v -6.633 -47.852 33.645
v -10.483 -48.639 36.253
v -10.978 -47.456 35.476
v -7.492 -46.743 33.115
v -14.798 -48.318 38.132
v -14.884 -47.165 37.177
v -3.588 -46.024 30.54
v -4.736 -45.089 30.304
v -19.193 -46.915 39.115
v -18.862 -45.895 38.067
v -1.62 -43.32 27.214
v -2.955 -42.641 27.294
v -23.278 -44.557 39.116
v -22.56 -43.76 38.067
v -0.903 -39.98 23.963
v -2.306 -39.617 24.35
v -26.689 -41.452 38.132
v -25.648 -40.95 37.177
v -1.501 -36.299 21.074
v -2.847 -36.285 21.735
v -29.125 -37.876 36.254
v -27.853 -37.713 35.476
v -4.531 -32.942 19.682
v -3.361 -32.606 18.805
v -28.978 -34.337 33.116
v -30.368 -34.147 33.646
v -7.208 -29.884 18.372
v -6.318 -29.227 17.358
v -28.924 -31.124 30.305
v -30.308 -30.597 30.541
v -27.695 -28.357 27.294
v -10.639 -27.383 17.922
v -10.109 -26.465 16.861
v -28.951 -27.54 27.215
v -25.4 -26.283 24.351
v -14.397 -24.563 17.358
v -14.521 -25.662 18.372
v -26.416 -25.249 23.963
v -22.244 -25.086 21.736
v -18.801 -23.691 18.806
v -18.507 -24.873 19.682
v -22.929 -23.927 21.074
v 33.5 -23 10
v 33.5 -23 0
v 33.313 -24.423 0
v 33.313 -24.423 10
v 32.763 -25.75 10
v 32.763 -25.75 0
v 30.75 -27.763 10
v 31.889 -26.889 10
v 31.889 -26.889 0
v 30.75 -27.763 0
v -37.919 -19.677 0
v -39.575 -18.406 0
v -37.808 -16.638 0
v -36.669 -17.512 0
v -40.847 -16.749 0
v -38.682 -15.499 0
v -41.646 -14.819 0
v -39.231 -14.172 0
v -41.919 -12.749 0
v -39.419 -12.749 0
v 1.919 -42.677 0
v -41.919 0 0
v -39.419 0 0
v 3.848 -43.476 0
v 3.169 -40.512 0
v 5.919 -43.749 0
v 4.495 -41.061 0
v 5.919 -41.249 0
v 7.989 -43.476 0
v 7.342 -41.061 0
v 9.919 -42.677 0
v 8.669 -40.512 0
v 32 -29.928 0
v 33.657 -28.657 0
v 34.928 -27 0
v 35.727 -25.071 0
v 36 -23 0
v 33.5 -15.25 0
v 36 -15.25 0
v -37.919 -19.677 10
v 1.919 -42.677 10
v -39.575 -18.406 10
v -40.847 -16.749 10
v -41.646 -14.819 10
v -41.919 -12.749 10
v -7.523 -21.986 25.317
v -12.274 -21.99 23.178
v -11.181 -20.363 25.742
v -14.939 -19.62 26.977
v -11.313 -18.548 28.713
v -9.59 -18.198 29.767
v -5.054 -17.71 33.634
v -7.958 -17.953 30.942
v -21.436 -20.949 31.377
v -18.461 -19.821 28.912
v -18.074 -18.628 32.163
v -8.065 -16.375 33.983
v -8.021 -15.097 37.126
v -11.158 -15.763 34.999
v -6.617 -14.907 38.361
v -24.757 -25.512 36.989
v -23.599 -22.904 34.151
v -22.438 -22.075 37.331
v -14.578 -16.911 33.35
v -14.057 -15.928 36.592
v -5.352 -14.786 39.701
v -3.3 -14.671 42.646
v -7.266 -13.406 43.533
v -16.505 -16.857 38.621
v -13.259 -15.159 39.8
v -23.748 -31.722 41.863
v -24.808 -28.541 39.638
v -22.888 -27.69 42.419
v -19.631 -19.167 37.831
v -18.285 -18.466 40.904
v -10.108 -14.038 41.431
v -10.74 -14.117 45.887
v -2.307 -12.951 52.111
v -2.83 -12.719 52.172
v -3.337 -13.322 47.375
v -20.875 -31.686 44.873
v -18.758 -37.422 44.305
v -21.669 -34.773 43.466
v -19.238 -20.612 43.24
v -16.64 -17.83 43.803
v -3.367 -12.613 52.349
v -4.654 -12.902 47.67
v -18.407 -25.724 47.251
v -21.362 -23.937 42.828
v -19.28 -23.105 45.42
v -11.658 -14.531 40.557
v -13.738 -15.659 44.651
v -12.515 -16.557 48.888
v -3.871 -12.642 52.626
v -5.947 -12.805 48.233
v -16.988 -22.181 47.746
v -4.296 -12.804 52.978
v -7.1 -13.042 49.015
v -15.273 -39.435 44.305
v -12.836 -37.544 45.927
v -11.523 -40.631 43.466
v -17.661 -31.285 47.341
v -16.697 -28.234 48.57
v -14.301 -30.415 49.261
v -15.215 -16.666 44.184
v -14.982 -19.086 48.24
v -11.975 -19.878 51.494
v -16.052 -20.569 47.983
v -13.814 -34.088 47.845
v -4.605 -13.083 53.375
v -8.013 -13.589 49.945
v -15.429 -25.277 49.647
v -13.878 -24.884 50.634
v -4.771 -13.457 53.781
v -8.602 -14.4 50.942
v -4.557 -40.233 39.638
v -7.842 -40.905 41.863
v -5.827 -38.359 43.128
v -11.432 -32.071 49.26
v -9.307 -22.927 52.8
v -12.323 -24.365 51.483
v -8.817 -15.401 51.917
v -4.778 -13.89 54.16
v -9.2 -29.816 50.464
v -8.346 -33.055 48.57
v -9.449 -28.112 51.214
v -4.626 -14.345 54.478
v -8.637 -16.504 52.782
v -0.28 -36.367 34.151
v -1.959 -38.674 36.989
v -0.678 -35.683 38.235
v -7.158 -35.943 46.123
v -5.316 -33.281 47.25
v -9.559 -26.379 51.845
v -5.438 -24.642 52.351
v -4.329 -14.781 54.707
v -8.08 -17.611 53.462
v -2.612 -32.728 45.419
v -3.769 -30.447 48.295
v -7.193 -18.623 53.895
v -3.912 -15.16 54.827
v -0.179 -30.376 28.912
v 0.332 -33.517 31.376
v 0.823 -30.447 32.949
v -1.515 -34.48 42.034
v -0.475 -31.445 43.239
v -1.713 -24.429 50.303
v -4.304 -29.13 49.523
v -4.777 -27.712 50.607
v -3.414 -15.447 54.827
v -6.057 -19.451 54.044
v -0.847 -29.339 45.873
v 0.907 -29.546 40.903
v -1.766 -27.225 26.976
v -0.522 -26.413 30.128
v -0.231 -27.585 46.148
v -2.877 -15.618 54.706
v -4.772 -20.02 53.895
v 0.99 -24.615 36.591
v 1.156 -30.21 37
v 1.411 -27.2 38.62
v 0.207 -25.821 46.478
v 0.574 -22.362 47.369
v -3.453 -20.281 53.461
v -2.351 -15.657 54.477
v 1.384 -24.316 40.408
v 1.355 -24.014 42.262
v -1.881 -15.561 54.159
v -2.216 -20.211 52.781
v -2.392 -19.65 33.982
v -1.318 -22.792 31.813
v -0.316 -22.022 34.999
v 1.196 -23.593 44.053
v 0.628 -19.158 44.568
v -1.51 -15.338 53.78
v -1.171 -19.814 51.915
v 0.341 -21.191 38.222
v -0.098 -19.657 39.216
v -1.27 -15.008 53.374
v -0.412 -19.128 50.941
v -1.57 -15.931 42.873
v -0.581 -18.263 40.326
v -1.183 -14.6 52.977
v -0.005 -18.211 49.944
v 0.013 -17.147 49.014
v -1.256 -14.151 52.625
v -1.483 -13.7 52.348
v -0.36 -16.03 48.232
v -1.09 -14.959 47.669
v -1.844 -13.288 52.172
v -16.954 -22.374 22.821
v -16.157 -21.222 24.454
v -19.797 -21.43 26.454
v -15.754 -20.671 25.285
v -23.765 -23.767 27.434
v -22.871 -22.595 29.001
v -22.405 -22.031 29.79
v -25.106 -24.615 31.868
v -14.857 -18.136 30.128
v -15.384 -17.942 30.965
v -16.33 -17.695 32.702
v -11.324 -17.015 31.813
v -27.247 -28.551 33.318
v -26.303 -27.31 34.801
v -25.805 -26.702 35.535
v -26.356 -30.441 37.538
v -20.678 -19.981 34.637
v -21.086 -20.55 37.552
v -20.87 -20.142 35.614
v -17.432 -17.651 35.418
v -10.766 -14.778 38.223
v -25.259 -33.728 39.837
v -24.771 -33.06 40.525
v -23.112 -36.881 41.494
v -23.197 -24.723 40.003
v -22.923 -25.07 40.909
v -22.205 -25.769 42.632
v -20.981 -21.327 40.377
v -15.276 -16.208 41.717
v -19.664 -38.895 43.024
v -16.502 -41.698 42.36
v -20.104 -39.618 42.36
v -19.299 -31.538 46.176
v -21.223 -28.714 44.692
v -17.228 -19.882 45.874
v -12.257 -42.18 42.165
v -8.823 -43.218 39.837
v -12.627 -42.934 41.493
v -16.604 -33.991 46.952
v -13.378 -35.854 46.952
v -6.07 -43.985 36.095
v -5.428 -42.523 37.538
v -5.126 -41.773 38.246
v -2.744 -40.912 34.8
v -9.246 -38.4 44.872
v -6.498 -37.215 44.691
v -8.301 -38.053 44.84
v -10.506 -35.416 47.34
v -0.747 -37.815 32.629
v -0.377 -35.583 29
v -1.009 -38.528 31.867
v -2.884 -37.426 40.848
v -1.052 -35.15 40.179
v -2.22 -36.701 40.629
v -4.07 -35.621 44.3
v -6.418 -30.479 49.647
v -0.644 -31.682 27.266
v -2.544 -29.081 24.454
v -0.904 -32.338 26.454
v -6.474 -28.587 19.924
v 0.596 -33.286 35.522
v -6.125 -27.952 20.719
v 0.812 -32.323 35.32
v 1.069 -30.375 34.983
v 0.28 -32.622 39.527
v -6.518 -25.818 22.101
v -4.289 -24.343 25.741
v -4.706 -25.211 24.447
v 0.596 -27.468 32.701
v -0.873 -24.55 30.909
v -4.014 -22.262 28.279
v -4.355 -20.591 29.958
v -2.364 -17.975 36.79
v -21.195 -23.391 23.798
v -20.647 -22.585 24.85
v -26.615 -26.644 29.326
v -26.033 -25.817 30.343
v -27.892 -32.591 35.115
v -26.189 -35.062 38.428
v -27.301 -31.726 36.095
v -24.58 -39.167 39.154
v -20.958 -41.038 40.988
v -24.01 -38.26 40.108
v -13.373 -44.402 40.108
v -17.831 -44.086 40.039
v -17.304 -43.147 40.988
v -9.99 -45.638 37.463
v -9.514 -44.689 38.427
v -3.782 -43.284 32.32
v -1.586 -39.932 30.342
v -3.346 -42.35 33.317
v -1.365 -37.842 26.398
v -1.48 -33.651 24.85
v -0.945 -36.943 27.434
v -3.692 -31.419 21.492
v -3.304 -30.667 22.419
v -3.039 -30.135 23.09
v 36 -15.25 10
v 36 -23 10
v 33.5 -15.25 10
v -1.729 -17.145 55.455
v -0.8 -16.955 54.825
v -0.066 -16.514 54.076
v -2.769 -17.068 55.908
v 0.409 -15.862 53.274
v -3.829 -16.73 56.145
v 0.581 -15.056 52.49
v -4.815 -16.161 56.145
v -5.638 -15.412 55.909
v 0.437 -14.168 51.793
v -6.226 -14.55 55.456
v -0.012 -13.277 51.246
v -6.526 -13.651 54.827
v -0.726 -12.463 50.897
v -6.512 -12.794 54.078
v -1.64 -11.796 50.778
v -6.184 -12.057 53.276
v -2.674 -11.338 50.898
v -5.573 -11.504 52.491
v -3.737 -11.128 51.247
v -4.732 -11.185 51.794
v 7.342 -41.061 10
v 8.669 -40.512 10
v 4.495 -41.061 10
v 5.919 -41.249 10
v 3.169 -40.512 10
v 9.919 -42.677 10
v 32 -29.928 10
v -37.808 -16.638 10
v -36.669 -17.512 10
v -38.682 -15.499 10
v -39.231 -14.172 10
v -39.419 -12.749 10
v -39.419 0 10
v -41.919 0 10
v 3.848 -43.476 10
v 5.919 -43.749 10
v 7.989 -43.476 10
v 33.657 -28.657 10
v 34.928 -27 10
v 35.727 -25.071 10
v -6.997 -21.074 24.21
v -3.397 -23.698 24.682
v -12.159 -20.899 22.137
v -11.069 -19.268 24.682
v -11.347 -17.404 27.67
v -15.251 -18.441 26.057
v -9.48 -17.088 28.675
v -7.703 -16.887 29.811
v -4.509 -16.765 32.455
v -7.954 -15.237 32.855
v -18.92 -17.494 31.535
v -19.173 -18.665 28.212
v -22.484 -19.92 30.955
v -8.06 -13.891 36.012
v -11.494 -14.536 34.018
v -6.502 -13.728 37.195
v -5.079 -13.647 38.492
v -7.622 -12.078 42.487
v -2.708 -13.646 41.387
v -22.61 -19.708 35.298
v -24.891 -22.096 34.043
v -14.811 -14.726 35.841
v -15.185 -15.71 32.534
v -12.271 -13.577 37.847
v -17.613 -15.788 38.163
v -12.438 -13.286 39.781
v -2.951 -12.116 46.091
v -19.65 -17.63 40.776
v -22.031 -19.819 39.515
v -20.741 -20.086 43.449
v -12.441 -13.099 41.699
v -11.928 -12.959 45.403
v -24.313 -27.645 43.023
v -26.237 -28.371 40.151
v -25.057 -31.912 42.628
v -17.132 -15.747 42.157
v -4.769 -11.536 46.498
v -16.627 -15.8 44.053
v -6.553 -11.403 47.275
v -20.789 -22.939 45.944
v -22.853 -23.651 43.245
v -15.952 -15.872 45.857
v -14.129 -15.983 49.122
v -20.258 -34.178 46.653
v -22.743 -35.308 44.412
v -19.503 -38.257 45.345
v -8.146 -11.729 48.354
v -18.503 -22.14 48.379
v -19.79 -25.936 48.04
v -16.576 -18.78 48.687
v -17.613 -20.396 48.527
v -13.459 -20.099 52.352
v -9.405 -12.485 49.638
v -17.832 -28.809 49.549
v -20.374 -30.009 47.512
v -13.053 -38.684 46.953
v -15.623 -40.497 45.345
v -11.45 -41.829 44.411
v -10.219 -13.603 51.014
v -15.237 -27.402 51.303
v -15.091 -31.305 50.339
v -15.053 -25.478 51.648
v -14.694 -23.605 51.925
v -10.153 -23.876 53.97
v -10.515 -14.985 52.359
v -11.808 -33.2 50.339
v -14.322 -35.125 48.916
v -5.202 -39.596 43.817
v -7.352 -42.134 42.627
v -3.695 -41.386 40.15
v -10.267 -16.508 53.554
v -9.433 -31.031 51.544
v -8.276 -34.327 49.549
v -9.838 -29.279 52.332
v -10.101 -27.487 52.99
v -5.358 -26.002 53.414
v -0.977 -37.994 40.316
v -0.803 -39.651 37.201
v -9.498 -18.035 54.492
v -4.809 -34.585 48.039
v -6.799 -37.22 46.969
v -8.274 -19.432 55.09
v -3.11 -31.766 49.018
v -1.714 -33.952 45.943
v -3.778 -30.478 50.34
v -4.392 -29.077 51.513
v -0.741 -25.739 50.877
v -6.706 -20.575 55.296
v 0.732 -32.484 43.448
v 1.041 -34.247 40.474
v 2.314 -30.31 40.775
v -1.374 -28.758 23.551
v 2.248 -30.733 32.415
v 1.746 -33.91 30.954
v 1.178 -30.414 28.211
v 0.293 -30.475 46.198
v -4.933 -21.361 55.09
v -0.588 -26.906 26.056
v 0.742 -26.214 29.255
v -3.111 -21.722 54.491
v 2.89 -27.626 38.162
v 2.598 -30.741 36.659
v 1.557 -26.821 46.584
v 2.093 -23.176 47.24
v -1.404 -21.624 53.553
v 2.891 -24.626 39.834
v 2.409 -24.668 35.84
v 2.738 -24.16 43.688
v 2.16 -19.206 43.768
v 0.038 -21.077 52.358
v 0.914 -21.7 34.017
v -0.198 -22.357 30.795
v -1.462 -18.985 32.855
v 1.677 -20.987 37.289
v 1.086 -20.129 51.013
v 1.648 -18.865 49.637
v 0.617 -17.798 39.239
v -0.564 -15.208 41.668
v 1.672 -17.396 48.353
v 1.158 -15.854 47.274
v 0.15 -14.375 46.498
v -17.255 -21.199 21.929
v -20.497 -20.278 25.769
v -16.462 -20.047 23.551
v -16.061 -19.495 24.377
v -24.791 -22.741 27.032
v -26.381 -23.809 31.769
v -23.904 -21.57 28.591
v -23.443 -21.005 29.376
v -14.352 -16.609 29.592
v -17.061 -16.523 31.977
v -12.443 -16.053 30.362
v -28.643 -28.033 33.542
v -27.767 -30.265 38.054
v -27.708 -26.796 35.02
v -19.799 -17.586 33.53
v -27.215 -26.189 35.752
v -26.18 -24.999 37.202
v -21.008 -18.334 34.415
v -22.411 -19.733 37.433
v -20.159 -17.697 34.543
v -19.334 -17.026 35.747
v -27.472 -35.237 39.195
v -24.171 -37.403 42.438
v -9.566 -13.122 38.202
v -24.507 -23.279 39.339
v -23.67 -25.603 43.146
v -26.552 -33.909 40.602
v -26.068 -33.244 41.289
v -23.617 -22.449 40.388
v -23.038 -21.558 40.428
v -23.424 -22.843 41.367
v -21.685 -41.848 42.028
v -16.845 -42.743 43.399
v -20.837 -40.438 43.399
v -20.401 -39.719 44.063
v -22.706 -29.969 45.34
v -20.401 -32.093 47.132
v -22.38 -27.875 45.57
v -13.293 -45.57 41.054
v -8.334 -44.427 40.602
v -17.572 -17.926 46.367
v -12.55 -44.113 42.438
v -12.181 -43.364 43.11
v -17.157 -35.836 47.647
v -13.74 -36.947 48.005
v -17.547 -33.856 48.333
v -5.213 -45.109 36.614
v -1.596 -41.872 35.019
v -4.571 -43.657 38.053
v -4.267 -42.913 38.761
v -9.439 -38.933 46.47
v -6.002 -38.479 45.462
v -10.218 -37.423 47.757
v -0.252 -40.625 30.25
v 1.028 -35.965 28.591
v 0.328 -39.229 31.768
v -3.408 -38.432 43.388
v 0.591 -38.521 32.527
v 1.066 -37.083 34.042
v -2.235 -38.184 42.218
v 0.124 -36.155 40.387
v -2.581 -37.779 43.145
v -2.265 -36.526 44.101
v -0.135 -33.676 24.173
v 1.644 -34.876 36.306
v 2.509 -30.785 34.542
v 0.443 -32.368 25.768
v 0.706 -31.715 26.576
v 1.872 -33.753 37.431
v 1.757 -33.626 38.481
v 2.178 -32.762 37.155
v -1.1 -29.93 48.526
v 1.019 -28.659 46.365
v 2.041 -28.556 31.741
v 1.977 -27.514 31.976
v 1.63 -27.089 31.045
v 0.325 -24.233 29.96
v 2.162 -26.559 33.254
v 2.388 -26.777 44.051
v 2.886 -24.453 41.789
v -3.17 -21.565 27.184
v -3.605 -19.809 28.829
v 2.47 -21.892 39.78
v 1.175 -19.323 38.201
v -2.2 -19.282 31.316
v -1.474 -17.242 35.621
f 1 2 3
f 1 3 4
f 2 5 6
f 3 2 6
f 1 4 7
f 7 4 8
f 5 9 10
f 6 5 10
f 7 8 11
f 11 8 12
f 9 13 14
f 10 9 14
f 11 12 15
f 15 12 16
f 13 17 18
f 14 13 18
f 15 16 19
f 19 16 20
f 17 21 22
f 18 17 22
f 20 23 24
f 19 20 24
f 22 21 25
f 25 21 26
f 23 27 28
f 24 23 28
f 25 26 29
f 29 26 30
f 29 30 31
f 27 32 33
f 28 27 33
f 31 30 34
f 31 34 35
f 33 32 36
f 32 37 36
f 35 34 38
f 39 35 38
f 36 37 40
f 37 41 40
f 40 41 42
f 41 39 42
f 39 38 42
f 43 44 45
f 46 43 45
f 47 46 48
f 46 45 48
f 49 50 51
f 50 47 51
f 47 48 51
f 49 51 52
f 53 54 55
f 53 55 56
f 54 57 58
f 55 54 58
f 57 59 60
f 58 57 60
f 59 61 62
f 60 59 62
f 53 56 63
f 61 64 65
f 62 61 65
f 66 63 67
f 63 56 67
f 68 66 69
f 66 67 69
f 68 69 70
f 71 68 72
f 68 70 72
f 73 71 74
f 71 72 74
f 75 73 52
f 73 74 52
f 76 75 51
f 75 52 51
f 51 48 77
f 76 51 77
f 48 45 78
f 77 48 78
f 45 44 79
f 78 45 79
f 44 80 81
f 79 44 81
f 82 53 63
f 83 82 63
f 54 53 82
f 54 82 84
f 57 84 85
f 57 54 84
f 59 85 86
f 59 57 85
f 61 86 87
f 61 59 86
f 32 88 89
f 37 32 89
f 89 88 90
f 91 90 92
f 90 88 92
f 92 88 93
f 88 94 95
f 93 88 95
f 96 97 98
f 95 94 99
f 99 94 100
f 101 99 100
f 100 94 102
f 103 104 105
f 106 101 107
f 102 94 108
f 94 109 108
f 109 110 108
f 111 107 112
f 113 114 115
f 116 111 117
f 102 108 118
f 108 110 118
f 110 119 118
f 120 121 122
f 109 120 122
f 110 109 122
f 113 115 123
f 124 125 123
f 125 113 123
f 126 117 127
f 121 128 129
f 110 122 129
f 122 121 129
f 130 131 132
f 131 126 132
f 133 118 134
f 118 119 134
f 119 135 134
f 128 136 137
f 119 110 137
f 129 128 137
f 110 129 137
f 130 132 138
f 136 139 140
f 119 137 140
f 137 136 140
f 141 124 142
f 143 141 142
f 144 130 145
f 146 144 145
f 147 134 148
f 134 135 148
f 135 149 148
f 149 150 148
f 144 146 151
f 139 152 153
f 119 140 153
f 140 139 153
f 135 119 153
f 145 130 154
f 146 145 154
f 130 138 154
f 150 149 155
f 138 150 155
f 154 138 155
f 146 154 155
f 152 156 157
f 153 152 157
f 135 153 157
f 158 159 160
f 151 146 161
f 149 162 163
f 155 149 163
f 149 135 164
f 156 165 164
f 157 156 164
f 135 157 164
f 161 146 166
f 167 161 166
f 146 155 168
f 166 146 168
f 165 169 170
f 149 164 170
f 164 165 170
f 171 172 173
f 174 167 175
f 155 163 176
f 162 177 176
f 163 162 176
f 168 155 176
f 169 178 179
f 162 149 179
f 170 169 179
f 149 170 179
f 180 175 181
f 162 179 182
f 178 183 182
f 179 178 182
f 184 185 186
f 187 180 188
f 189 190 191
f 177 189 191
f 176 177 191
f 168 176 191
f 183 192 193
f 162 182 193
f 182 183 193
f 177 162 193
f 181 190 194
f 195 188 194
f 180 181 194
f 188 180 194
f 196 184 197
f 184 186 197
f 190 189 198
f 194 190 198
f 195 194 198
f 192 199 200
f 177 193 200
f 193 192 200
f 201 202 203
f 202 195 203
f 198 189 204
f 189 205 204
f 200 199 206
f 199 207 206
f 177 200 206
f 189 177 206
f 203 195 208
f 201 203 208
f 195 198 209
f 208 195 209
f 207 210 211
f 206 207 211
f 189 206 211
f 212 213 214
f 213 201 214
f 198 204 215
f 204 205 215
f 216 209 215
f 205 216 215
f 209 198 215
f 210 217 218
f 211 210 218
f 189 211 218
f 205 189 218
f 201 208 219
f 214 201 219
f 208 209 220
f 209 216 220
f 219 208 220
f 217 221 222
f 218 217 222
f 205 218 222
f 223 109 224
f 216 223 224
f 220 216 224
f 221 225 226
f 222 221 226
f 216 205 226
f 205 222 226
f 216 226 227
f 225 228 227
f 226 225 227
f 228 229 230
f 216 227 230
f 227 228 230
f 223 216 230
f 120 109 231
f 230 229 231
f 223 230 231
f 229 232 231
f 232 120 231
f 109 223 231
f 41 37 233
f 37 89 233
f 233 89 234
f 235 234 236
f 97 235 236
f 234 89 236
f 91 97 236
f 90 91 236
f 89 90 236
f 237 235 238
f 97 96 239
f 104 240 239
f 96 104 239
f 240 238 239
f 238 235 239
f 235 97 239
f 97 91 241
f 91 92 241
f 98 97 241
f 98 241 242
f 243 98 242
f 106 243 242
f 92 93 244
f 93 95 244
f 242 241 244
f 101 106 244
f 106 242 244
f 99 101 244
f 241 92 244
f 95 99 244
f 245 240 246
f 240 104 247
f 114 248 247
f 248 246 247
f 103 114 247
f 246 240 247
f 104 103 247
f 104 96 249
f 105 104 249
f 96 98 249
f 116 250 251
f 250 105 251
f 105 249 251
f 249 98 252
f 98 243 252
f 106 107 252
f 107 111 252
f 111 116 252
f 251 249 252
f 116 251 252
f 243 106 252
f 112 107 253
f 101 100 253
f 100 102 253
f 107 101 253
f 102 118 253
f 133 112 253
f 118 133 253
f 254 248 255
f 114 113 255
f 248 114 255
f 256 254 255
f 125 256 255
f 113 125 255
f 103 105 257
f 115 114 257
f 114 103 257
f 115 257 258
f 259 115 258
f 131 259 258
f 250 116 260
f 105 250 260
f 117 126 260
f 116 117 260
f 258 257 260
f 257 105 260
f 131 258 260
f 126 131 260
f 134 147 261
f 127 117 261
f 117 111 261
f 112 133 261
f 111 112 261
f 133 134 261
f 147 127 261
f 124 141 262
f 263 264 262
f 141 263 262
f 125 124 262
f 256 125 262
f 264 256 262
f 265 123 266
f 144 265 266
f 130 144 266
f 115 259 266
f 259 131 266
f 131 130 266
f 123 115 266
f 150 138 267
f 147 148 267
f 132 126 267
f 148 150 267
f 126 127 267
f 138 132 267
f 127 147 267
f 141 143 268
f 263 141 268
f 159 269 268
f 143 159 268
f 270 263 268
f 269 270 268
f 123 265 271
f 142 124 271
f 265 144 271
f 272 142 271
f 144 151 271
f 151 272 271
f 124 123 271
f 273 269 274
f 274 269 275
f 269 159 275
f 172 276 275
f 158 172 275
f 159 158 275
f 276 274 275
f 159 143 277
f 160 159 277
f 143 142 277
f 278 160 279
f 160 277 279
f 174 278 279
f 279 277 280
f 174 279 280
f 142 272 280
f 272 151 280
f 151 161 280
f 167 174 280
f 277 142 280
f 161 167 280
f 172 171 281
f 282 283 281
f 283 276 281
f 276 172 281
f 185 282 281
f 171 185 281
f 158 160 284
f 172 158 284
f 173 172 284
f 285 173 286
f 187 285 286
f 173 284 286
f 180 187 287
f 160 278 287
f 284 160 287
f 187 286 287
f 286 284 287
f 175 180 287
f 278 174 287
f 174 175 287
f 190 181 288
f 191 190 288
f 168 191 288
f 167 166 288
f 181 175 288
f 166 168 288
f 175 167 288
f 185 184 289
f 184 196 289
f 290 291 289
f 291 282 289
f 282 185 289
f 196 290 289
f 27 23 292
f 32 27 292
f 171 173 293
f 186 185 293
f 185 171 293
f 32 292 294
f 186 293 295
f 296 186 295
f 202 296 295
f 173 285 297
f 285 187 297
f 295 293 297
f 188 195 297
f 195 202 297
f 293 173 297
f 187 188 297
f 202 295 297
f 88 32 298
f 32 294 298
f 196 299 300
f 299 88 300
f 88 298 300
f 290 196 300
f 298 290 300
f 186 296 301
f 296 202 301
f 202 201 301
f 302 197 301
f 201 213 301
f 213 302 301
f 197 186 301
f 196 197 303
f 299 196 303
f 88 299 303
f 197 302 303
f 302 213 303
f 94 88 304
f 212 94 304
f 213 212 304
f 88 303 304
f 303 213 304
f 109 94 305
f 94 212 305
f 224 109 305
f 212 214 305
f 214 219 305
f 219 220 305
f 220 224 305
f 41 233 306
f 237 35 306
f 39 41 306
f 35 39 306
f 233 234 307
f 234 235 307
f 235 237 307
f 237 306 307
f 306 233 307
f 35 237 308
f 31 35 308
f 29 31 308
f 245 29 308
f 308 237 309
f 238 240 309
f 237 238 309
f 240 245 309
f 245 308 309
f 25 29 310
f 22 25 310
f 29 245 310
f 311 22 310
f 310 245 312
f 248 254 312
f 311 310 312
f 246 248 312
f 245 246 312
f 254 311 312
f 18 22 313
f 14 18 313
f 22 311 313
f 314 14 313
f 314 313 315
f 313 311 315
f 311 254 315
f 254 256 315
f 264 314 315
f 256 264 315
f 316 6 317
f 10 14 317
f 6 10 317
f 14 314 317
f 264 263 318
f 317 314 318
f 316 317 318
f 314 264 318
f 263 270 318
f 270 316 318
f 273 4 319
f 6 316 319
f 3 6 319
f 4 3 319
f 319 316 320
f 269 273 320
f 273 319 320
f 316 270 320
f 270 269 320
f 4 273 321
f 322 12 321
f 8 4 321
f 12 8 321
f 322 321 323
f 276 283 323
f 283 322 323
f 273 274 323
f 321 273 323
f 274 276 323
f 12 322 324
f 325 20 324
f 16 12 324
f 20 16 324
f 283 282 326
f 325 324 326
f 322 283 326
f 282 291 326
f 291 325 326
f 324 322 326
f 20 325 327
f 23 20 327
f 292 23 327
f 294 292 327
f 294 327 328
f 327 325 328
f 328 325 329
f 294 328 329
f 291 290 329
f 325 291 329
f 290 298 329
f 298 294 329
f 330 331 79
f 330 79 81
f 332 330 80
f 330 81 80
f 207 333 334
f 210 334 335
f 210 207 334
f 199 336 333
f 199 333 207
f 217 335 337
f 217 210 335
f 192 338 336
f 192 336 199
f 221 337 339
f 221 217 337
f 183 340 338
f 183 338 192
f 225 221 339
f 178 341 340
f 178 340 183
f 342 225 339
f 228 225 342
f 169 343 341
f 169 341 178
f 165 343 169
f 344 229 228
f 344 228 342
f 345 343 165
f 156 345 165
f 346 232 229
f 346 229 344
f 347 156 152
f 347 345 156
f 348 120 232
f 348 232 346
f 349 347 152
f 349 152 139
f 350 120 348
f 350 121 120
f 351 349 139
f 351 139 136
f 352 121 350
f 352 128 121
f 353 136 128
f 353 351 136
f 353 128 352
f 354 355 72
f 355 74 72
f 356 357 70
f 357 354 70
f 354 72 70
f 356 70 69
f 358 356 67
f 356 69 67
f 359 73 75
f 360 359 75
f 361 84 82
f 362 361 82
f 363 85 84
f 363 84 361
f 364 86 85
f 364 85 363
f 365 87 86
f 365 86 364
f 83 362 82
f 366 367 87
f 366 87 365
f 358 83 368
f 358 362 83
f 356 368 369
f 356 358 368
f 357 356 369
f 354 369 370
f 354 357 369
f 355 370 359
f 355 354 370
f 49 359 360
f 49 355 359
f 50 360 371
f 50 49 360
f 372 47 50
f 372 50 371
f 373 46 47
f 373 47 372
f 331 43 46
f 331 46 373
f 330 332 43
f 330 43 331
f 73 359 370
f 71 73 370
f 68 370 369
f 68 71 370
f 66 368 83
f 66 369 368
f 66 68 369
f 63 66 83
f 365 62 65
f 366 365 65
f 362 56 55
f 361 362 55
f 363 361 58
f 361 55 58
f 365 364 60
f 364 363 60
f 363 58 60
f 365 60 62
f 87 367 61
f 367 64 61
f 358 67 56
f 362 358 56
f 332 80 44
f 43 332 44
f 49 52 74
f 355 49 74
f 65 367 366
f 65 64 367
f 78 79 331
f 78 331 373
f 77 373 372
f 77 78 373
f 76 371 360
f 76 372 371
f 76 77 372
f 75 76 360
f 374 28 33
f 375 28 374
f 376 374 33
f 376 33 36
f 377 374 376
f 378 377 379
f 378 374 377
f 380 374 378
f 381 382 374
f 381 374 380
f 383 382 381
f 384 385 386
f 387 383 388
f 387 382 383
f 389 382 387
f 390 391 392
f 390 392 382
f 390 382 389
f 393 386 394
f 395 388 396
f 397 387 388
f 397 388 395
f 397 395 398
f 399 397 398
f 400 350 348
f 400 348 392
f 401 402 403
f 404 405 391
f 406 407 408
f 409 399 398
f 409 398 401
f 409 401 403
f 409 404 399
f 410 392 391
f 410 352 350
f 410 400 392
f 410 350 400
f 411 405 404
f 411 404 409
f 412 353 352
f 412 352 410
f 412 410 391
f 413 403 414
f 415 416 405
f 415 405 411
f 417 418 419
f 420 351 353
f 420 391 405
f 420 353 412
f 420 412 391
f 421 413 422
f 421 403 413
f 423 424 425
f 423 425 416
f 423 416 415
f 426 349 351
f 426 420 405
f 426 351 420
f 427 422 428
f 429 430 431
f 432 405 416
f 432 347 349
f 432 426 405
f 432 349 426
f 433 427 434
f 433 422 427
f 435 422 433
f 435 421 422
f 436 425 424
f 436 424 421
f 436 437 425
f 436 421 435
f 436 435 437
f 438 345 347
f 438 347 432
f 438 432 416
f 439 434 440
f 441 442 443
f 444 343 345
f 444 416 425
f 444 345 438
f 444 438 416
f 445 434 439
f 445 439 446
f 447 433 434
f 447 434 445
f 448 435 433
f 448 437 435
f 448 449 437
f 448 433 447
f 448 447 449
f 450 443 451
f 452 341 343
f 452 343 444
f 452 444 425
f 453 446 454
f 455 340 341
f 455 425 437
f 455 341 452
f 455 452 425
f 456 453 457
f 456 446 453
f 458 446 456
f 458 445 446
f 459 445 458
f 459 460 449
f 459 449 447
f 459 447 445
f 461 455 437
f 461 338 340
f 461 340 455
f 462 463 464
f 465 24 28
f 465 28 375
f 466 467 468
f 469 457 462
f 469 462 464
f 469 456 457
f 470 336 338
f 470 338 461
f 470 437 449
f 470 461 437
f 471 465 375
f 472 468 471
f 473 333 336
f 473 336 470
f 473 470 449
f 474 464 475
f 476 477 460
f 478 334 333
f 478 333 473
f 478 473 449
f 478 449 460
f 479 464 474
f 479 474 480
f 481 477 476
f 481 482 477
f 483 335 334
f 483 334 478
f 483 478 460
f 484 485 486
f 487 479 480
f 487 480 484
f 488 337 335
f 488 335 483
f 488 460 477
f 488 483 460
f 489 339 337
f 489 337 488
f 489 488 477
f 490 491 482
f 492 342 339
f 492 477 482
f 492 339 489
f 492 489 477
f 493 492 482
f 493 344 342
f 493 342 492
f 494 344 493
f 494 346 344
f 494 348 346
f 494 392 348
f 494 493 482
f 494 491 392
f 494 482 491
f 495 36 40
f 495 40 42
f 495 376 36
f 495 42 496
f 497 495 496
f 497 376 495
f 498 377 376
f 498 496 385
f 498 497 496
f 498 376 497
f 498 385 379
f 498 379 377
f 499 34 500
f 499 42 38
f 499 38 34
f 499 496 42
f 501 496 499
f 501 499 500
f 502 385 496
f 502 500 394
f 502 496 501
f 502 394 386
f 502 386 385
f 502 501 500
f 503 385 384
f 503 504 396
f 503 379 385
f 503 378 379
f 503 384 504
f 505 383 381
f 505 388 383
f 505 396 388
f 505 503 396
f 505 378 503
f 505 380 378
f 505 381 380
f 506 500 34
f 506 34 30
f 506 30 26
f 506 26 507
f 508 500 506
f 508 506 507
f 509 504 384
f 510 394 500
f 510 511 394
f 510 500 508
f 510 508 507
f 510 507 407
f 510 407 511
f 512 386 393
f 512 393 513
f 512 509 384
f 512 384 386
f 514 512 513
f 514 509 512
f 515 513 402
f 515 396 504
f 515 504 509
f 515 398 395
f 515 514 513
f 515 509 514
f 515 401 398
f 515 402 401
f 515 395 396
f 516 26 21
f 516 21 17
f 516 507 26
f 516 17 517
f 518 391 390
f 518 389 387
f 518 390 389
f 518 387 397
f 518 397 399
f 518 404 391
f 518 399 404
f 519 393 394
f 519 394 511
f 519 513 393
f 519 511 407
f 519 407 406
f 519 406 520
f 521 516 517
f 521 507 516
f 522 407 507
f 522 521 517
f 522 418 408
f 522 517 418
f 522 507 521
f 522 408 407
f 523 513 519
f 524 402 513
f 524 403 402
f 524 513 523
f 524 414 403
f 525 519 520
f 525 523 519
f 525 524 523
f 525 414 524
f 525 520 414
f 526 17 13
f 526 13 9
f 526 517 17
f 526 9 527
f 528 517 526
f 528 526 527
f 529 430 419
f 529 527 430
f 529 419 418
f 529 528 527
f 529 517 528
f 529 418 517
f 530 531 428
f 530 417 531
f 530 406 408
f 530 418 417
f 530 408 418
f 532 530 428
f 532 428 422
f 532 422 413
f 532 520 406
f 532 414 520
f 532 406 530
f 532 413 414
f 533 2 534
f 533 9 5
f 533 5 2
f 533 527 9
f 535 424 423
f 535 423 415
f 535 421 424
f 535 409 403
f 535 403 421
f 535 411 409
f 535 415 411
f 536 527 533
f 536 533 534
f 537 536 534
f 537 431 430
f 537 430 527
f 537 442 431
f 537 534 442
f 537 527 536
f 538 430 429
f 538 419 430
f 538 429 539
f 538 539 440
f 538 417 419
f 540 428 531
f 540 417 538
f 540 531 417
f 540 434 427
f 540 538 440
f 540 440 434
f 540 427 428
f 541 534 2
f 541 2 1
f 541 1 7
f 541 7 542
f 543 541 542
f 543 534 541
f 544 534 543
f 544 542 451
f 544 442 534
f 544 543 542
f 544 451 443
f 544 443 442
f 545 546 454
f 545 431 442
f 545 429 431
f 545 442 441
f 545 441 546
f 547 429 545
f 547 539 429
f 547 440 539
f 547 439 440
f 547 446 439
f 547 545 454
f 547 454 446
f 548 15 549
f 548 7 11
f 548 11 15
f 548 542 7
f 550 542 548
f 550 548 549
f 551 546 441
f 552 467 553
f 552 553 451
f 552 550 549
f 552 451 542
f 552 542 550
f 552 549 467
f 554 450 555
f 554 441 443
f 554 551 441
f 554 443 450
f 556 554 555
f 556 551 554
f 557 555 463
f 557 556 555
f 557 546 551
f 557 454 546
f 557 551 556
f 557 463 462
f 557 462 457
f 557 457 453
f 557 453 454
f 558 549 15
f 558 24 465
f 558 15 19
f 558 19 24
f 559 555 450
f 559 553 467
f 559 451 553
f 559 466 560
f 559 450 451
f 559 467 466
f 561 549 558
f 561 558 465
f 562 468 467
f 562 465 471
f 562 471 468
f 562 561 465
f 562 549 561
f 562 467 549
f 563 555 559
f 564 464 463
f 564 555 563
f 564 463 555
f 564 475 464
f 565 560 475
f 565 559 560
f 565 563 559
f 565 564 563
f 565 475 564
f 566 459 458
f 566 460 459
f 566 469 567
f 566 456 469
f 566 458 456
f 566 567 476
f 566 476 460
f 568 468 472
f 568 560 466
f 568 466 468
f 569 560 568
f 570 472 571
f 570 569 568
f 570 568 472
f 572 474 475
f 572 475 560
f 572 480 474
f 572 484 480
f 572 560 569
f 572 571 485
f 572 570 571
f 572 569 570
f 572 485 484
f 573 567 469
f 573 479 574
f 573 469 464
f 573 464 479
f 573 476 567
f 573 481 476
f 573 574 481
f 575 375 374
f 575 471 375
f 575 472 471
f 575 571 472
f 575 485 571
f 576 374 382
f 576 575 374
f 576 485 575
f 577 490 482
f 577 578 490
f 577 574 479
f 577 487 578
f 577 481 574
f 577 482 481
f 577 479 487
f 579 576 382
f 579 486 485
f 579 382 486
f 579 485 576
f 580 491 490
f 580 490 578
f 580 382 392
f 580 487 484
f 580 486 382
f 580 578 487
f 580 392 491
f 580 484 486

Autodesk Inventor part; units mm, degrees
ref_plane "YZ Plane" through (0, 0, 0) normal (1, 0, 0) x (0, 1, 0)
sketch "Sketch1" plane through (0, 0, 0) normal (0, 0, 1) x (1, 0, 0)
  circle A0 centre (-21.75, -3) radius 1 projected
  circle A1 centre (-14.9186, 14) radius 1.5 projected
  circle A2 centre (-14.9186, -14) radius 1.5 projected
  circle A3 centre (21, 8.5) radius 1.5 projected
  circle A4 centre (9, 0) radius 1.5 projected
  circle A5 centre (21, -8.5) radius 1.5 projected
  circle A6 centre (12, -9) radius 6 projected
  circle A7 centre (12, 9) radius 6 projected
  circle A8 centre (5.9186, 35.7487) radius 2 projected
  circle A9 centre (-33.9186, 12.7487) radius 2 projected
  circle A10 centre (-33.9186, -12.7487) radius 2 projected
  circle A11 centre (5.9186, -35.7487) radius 2 projected
  circle A12 centre (28, -23) radius 2 projected
  circle A13 centre (28, 23) radius 2 projected
  line L0 (27, -14.75) -> (7, -14.75) projected
  line L1 (7, 14.75) -> (27, 14.75) projected
  circle A14 centre (28, -23) radius 5
  circle A15 centre (5.9186, -35.7487) radius 5
  circle A16 centre (28, 23) radius 5
  circle A17 centre (5.9186, 35.7487) radius 5
  line L2 (-41.9186, 0) -> (-41.9186, -12.7487)
  arc A18 (-41.9186, -12.7487) -> (-37.9186, -19.6769) centre (-33.9186, -12.7487) ccw
  line L3 (-37.9186, -19.6769) -> (1.9186, -42.6769)
  arc A19 (1.9186, -42.6769) -> (9.9186, -42.6769) centre (5.9186, -35.7487) ccw
  line L4 (9.9186, -42.6769) -> (32, -29.9282)
  arc A20 (32, -29.9282) -> (36, -23) centre (28, -23) ccw
  circle A21 centre (28, -23) radius 5.5
  circle A22 centre (5.9186, -35.7487) radius 5.5
  arc A23 (30.75, -27.7631) -> (33.5, -23) centre (28, -23) ccw
  line L5 (30.75, -27.7631) -> (8.6686, -40.5119)
  arc A24 (3.1686, -40.5119) -> (8.6686, -40.5119) centre (5.9186, -35.7487) ccw
  line L6 (3.1686, -40.5119) -> (-36.6686, -17.5119)
  arc A25 (-39.4186, -12.7487) -> (-36.6686, -17.5119) centre (-33.9186, -12.7487) ccw
  line L7 (-39.4186, -12.7487) -> (-39.4186, 0)
  line L8 (36, -15.25) -> (7, -15.25)
  line L9 (33.5, -15.25) -> (33.5, -23)
  line L10 (36, -23) -> (36, -15.25)
  line L11 (-57.1316, 0) -> (50.3748, 0) construction
  line L12 (-41.9186, 0) -> (-39.4186, 0)
  line L13 (36, -23) -> (36, 23) projected
  arc A26 (36, 23) -> (32, 29.9282) centre (28, 23) ccw projected
  line L14 (32, 29.9282) -> (9.9186, 42.6769) projected
  arc A27 (9.9186, 42.6769) -> (1.9186, 42.6769) centre (5.9186, 35.7487) ccw projected
  line L15 (1.9186, 42.6769) -> (-37.9186, 19.6769) projected
  arc A28 (-37.9186, 19.6769) -> (-41.9186, 12.7487) centre (-33.9186, 12.7487) ccw projected
  line L16 (-41.9186, 12.7487) -> (-41.9186, -12.7487) projected
  arc A29 (-41.9186, -12.7487) -> (-37.9186, -19.6769) centre (-33.9186, -12.7487) ccw projected
  line L17 (-37.9186, -19.6769) -> (1.9186, -42.6769) projected
  arc A30 (1.9186, -42.6769) -> (9.9186, -42.6769) centre (5.9186, -35.7487) ccw projected
  line L18 (9.9186, -42.6769) -> (32, -29.9282) projected
  arc A31 (32, -29.9282) -> (36, -23) centre (28, -23) ccw projected
  circle A32 centre (-33.4186, -0.7261) radius 1.5 projected
  circle A33 centre (16.0805, 29.3044) radius 1.5 projected
  circle A34 centre (17.3381, -28.5783) radius 1.5 projected
  circle A35 centre (-13.1686, 3) radius 1 projected
  point P0 (0, 0)
  point P1 (-12.8721, -34.1375)
  point P2 (-12.8721, -31.2507)
  dimension "d3" = 0.5
  dimension "d4" = 0.5
  dimension "d7" = 0.5
extrude "Extrusion1" add sketch "Sketch1" along normal blind 10 contours L12 L7 A25 L6 A22 L5 A21 L9 L8 L10 A20 L4 A19 L3 A18 L2
ref_plane "Work Plane1" through (-15.7131, -36.1715, 28.0312) normal (0.3536, 0.6124, 0.7071) x (0.866, -0.5, 0)
sketch "Sketch3" plane through (-15.7131, -36.1715, 28.0312) normal (0.3536, 0.6124, 0.7071) x (0.866, -0.5, 0)
  line L0 (-12.5, 15) -> (12.5, 15) projected
  arc A0 (-12.5, 15) -> (-15, 12.5) centre (-12.5, 12.5) ccw projected
  line L1 (-15, 12.5) -> (-15, -12.5) projected
  arc A1 (-15, -12.5) -> (-12.5, -15) centre (-12.5, -12.5) ccw projected
  line L2 (-12.5, -15) -> (12.5, -15) projected
  arc A2 (12.5, -15) -> (15, -12.5) centre (12.5, -12.5) ccw projected
  line L3 (15, 12.5) -> (15, -12.5) projected
  arc A3 (15, 12.5) -> (12.5, 15) centre (12.5, 12.5) ccw projected
  circle A4 centre (0, 0) radius 14.375 projected
  circle A5 centre (-12, -12) radius 1.75 projected
  circle A6 centre (-12, 12) radius 1.75 projected
  circle A7 centre (12, -12) radius 1.75 projected
  circle A8 centre (12, 12) radius 1.75 projected
  line L4 (0, 22.779) -> (0, -22.2099)
  point P0 (-4.4778, 47.5269)
ref_plane "Work Plane2" through (-15.7131, -36.1715, 28.0312) normal (0.866, -0.5, 0) x (0.3536, 0.6124, 0.7071)
ref_plane "Work Plane3" through (10.25, -12.0311, 55) normal (0, 0, 1) x (1, 0, 0)
sketch "Sketch5" plane through (-15.7131, -36.1715, 28.0312) normal (0.866, -0.5, 0) x (0.3536, 0.6124, 0.7071)
  line L0 (0.0278, -14.3239) -> (0.0278, -13.5559)
  line L1 (-72.0235, 0) -> (108.8939, 0) projected
  arc A0 (0.0278, -14.3239) -> (35.9865, -1.9308) centre (-0.1447, 44.5401) ccw
  arc A1 (0.0278, -15.8239) -> (35.9865, -3.8168) centre (-0.1447, 44.5401) ccw
  line L2 (35.9865, -1.9308) -> (35.9865, -3.8168)
  line L3 (0.0278, -14.3239) -> (0.0278, -15.8239)
  point P0 (7.8848, -47.5269)
  dimension "d13" = 1.5
revolve "Revolution2" add sketch "Sketch5" angle 360 about axis through (-15.7131, -36.1715, 28.0312) along (0.3536, 0.6124, 0.7071)
sketch "Sketch7" plane through (0, 0, 0) normal (0, 0, -1) x (-1, 0, 0)
  ellipse E0 centre (15.7131, -36.1715) end of major axis (28.1622, -28.984) minor radius 10.1647 (23.1946, -25.2911) -> (2.5497, -37.2104) ccw
  line L0 (-1.6967, -36.0168) -> (-0.1183, -38.7507)
  line L1 (10.1911, -51.6071) -> (31.8417, -39.1071) projected
  line L2 (25.8625, -23.7507) -> (24.2841, -21.0168)
  line L3 (-3.1686, -40.5119) -> (25.8625, -23.7507)
  line L4 (-3.951, -27.1122) -> (17.6996, -14.6122)
  ellipse E1 centre (18.5835, -16.1431) end of major axis (16.4184, -17.3931) minor radius 1.7678 (20.7485, -14.8931) -> (17.6996, -14.6122) ccw
  ellipse E2 centre (-3.0672, -28.6431) end of major axis (-0.9021, -27.3931) minor radius 1.7678 (-3.951, -27.1122) -> (-5.2322, -29.8931) ccw
  line L5 (24.2841, -21.0168) -> (20.7485, -14.8931) projected
  line L6 (24.2841, -21.0168) -> (20.7485, -14.8931)
  line L7 (20.7485, -14.8931) -> (29.5874, -30.2024) projected
  ellipse E3 centre (-3.0672, -28.6431) end of major axis (-0.9021, -27.3931) minor radius 1.7678 (-3.951, -27.1122) -> (-5.2322, -29.8931) ccw projected
  line L8 (-1.6967, -36.0168) -> (-5.2322, -29.8931)
  point P0 (0, 0)
sketch "Sketch8" plane through (-15.7131, -36.1715, 28.0312) normal (-0.3536, -0.6124, -0.7071) x (-0.866, 0.5, 0)
  line L0 (15, 5.0396) -> (15, -5.0396) projected
  arc A0 (15, -5.0396) -> (15, 5.0396) centre (0, 0) ccw projected
  arc A1 (-15, 5.0396) -> (-15, -5.0396) centre (0, 0) ccw projected
  line L1 (-15, 12.5) -> (-15, -12.5) projected
  circle A2 centre (-12, -12) radius 1.75 projected
  arc A3 (-12.0548, -10.2509) -> (-10.2509, -12.0548) centre (0, 0) ccw projected
  arc A4 (-5.0396, -15) -> (5.0396, -15) centre (0, 0) ccw projected
  line L2 (-12.5, -15) -> (12.5, -15) projected
  circle A5 centre (12, -12) radius 1.75 projected
  arc A6 (10.2509, -12.0548) -> (12.0548, -10.2509) centre (0, 0) ccw projected
  circle A7 centre (12, 12) radius 1.75 projected
  arc A8 (12.0548, 10.2509) -> (10.2509, 12.0548) centre (0, 0) ccw projected
  arc A9 (-10.2509, 12.0548) -> (-12.0548, 10.2509) centre (0, 0) ccw projected
  circle A10 centre (-12, 12) radius 1.75 projected
  point P0 (4.4778, 47.5269)
sketch "Sketch9" plane through (-15.7131, -36.1715, 28.0312) normal (-0.3536, -0.6124, -0.7071) x (-0.866, 0.5, 0)
  arc A0 (15, 12.5) -> (12.5, 15) centre (12.5, 12.5) ccw
  arc A1 (-12.5, 15) -> (-15, 12.5) centre (-12.5, 12.5) ccw
  line L0 (-15, 15) -> (-15, 12.5)
  line L1 (15, 12.5) -> (15, 15)
  line L2 (12.5, 15) -> (-12.5, 15) projected
  line L3 (-12.5, 15) -> (-15, 15)
  line L4 (12.5, 15) -> (15, 15)
  point P0 (4.4778, 47.5269)
  point P1 (-1.4434, 15)
sketch "Sketch10" plane through (0, 0, 0) normal (0, 0, -1) x (-1, 0, 0)
  ellipse E0 centre (18.5835, -16.1431) end of major axis (20.7485, -14.8931) minor radius 1.7678 (20.7485, -14.8931) -> (17.6996, -14.6122) ccw projected
  line L0 (20.7485, -14.8931) -> (19.8647, -13.3622) projected
  line L1 (17.6996, -14.6122) -> (19.8647, -13.3622) projected
  ellipse E1 centre (-3.0672, -28.6431) end of major axis (-5.2322, -29.8931) minor radius 1.7678 (-3.951, -27.1122) -> (-5.2322, -29.8931) ccw projected
  line L2 (-6.1161, -28.3622) -> (-3.951, -27.1122) projected
  line L3 (-5.2322, -29.8931) -> (-6.1161, -28.3622) projected
  point P0 (0, 0)
sketch "Sketch11" plane through (0, 0, 10) normal (0, 0, 1) x (1, 0, 0)
  line L0 (-1.1317, -40.9158) -> (1.9186, -42.6769)
  arc A0 (1.9186, -42.6769) -> (9.9186, -42.6769) centre (5.9186, -35.7487) ccw
  line L1 (9.9186, -42.6769) -> (32, -29.9282) projected
  arc A1 (32, -29.9282) -> (36, -23) centre (28, -23) ccw projected
  line L2 (36, -23) -> (36, -15.25) projected
  line L3 (36, -15.25) -> (33.5, -15.25) projected
  line L4 (33.5, -15.25) -> (33.5, -23) projected
  line L5 (30.75, -27.7631) -> (8.6686, -40.5119) projected
  line L6 (3.1686, -40.5119) -> (0.1183, -38.7507)
  line L7 (-1.1317, -40.9158) -> (0.1183, -38.7507)
  arc A2 (3.1686, -40.5119) -> (8.6686, -40.5119) centre (5.9186, -35.7487) ccw projected
  arc A3 (30.75, -27.7631) -> (33.5, -23) centre (28, -23) ccw projected
  point P0 (0, 0)
sketch "Sketch12" plane through (0.1183, -38.7507, 36.4914) normal (-0.866, 0.5, 0) x (0, 0, 1)
  line L0 (-36.4914, 2.75) -> (-36.4914, 0) projected
  line L1 (-36.4914, 0) -> (18.5086, 0)
  line L2 (-36.4914, 2.75) -> (-2.75, 2.75)
  line L3 (2.5, -2.5) -> (0, 0)
  line L4 (2.5, -2.5) -> (18.5086, -2.5)
  line L5 (18.5086, 0) -> (18.5086, -2.5)
  line L6 (0, 0) -> (18.5086, 0) projected
  point P0 (-36.4914, 33.5)
sketch "Sketch14" plane through (-24.7455, -27.2824, 38.9914) normal (-0.5, -0.866, 0) x (0.866, -0.5, 0)
  line L0 (24.5337, 0) -> (0, 0) projected
  point P0 (7.7891, -38.9914)
sketch "Sketch16" plane through (0, 0, 10) normal (0, 0, 1) x (1, 0, 0)
  line L0 (-1.1317, -40.9158) -> (0.1183, -38.7507) projected
  line L1 (0.1183, -38.7507) -> (-25.8625, -23.7507) projected
  line L2 (-25.8625, -23.7507) -> (-36.6686, -17.5119) projected
  arc A0 (-39.4186, -12.7487) -> (-36.6686, -17.5119) centre (-33.9186, -12.7487) ccw projected
  line L3 (-39.4186, -12.7487) -> (-39.4186, 0) projected
  line L4 (-39.4186, 0) -> (-41.9186, 0) projected
  line L5 (-41.9186, 0) -> (-41.9186, -12.7487) projected
  arc A1 (-41.9186, -12.7487) -> (-37.9186, -19.6769) centre (-33.9186, -12.7487) ccw projected
  line L6 (-37.9186, -19.6769) -> (-1.1317, -40.9158) projected
  line L7 (-25.8625, -23.7507) -> (-27.1125, -25.9158) projected
  point P0 (0, 0)
sketch "Sketch17" plane through (33.5, -15.25, 0) normal (0, 1, 0) x (1, 0, 0)
  line L0 (0, 0) -> (2.5, 0) projected
  line L1 (0, -30) -> (0, -55)
  line L2 (2.5, -55) -> (0, -55) projected
  line L3 (2.5, -30) -> (2.5, -55)
  line L4 (0, -30) -> (2.5, -30)
  point P0 (-33.5, 0)
  dimension "d41" = 25
sketch "Sketch18" plane through (0, 0, 0) normal (0, 0, -1) x (-1, 0, 0)
  circle A0 centre (-5.9186, 35.7487) radius 5 projected
  circle A1 centre (-5.9186, -35.7487) radius 5.5 projected
  point P0 (0, 0)
sketch "Sketch19" plane through (0, 0, 0) normal (0, 0, -1) x (-1, 0, 0)
  arc A0 (-19.9776, 27.0544) -> (-12.1834, 31.5544) centre (-16.0805, 29.3044) ccw
  line L0 (-22.9776, 32.2505) -> (-15.1834, 36.7505)
  line L1 (-19.9776, 27.0544) -> (-22.9776, 32.2505)
  line L2 (-12.1834, 31.5544) -> (-15.1834, 36.7505)
  circle A1 centre (-16.0805, 29.3044) radius 1.5
  line L3 (-21.2352, -26.3283) -> (-24.2352, -31.5245)
  line L4 (-16.441, -36.0245) -> (-24.2352, -31.5245)
  line L5 (-13.441, -30.8283) -> (-16.441, -36.0245)
  arc A2 (-13.441, -30.8283) -> (-21.2352, -26.3283) centre (-17.3381, -28.5783) ccw
  circle A3 centre (-17.3381, -28.5783) radius 1.5
  line L6 (33.4186, -5.2261) -> (39.4186, -5.2261)
  line L7 (39.4186, 3.7739) -> (39.4186, -5.2261)
  line L8 (33.4186, 3.7739) -> (39.4186, 3.7739)
  arc A4 (33.4186, 3.7739) -> (33.4186, -5.2261) centre (33.4186, -0.7261) ccw
  circle A5 centre (33.4186, -0.7261) radius 1.5
  point P0 (0, 0)
  dimension "d46" = 9
  dimension "d47" = 6
  dimension "d48" = 3
  dimension "d51" = 360
sketch "Sketch21" plane through (-27.1125, -25.9158, 24.8492) normal (0.866, -0.5, 0) x (0, 0, -1)
  line L0 (0, 0) -> (2.5, 2.5) projected
  line L1 (14.8492, 0) -> (0, 0)
  line L2 (14.8492, 2.5) -> (14.8492, 0)
  line L3 (14.8492, 2.5) -> (12.3492, 2.5)
  line L4 (12.3492, 2.5) -> (2.5, 2.5)
  line L5 (7.4246, 7.4246) -> (14.8492, 0)
  point P0 (24.8492, 36)
sketch "Sketch23" plane through (0, 0, 55) normal (0, 0, 1) x (1, 0, 0)
  arc A0 (-39.8989, -18.0625) -> (-37.9186, -19.6769) centre (-33.9186, -12.7487) ccw projected
  line L0 (1.9186, -42.6769) -> (-40.1029, -18.4158) projected
  line L1 (-40.1029, -18.4158) -> (-39.8989, -18.0625) projected
  line L2 (1.9186, 42.6769) -> (-40.1029, 18.4158) projected
  line L3 (-40.1029, 18.4158) -> (-39.8989, 18.0625) projected
  arc A1 (-37.9186, 19.6769) -> (-39.8989, 18.0625) centre (-33.9186, 12.7487) ccw projected
  point P0 (0, 0)
properties part number "nozle mask front"
